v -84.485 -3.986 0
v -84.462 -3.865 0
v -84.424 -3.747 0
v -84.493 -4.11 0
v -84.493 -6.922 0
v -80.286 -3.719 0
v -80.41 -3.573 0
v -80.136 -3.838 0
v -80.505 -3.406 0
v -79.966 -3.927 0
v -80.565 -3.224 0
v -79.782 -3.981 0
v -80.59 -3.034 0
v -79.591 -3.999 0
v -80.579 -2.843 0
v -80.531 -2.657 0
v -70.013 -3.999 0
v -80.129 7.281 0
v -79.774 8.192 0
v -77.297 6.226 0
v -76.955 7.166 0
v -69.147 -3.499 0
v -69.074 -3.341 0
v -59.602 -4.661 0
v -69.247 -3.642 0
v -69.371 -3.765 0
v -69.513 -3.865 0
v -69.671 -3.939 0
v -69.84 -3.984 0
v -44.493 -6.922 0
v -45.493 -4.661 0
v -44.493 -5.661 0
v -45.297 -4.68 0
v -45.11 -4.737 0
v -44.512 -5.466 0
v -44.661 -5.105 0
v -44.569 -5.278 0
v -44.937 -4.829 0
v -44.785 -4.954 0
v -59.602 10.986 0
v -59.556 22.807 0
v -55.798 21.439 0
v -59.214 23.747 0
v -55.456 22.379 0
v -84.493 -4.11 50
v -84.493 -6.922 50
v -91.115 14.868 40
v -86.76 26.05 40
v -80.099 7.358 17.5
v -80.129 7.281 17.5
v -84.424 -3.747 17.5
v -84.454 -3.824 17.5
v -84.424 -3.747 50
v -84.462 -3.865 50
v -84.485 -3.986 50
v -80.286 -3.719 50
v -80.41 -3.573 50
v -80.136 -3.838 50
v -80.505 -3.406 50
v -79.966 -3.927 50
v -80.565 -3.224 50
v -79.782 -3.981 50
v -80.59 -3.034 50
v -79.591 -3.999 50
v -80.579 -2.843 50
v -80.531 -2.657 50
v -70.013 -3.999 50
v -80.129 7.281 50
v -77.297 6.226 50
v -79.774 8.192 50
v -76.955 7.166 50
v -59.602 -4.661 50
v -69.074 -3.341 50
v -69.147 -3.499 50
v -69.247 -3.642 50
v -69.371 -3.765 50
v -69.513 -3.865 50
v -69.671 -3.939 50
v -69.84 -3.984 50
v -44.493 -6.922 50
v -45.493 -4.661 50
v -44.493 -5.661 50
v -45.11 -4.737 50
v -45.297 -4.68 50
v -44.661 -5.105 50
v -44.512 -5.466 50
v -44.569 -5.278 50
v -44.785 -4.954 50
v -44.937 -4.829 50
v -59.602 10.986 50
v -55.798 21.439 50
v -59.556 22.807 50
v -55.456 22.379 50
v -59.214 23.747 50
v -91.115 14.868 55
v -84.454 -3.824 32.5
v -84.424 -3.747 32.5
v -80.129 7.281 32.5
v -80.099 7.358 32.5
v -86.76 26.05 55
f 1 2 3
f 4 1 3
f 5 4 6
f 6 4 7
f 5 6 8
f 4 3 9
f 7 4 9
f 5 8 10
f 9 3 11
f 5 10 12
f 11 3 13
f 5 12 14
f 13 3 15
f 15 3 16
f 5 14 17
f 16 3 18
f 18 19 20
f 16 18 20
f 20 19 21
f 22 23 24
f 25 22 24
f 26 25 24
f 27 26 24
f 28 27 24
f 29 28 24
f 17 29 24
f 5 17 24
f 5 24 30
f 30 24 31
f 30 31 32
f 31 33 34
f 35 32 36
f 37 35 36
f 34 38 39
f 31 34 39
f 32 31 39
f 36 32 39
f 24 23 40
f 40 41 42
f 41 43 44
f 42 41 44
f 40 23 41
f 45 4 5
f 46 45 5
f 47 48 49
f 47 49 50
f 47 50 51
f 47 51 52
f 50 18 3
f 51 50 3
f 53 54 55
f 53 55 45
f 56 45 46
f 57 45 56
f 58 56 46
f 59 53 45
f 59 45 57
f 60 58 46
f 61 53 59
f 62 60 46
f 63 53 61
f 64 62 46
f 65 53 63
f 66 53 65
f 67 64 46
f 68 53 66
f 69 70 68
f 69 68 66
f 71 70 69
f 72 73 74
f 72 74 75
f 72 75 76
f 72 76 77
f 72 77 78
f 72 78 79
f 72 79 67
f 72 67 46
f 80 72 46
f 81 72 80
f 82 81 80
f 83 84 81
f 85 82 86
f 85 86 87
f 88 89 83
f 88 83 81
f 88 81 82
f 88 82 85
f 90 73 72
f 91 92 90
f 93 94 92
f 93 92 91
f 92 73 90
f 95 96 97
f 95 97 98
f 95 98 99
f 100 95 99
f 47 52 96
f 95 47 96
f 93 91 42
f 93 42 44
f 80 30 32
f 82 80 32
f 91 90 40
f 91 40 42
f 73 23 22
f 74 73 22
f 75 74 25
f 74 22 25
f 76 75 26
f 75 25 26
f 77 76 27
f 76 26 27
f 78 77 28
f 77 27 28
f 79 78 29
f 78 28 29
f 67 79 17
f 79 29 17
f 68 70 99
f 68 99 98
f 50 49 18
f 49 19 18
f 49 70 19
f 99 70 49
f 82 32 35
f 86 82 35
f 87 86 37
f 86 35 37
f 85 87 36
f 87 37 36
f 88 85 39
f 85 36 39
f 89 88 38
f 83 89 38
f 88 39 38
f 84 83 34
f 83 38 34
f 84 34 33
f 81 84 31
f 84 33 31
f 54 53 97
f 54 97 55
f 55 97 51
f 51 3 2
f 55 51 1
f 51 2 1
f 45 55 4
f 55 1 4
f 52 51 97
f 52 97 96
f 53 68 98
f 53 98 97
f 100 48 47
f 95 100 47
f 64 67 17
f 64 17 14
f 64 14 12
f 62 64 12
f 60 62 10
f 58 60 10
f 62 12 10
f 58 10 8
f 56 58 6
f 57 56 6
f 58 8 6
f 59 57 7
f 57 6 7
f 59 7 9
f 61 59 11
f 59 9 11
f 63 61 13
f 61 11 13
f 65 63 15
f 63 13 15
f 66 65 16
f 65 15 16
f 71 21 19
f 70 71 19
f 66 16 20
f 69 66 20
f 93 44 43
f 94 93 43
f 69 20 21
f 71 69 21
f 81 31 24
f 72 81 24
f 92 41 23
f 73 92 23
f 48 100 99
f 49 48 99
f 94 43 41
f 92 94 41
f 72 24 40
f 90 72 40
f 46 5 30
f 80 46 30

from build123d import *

# Parameters (mm, degrees)
SALIENTE_EXTRUIR1_DEPTH = 50
CROQUIS3_W              = 15
CROQUIS3_H              = 12


with BuildPart() as part:
    # Croquis1 → Saliente-Extruir1 (new body)
    with BuildSketch(Plane.XY):
        with BuildLine():
            Line((-84.492533904, -6.921751872), (-44.492533904, -6.921751872))
            Line((-44.492533904, -6.921751872), (-44.492533904, -5.660932217))
            ThreePointArc((-44.492533904, -5.660932217), (-44.785427123, -4.953825435), (-45.492533904, -4.660932217))
            Line((-45.492533904, -4.660932217), (-59.602097354, -4.660932217))
            Line((-59.602097354, -4.660932217), (-59.602097354, 10.986403293))
            Line((-59.602097354, 10.986403293), (-55.79772825, 21.438821499))
            Line((-55.79772825, 21.438821499), (-55.455708107, 22.37851412))
            Line((-55.455708107, 22.37851412), (-59.21447859, 23.746594693))
            Line((-59.21447859, 23.746594693), (-59.556498733, 22.806902073))
            Line((-59.556498733, 22.806902073), (-69.073702494, -3.341400356))
            ThreePointArc((-69.073702494, -3.341400356), (-69.439818678, -3.818532257), (-70.013395115, -3.999380213))
            Line((-70.013395115, -3.999380213), (-79.590995067, -3.999380213))
            ThreePointArc((-79.590995067, -3.999380213), (-80.410147111, -3.572956649), (-80.530687688, -2.657360069))
            Line((-80.530687688, -2.657360069), (-77.297371662, 6.226102703))
            Line((-77.297371662, 6.226102703), (-76.955351518, 7.165795324))
            Line((-76.955351518, 7.165795324), (-79.774429381, 8.191855754))
            Line((-79.774429381, 8.191855754), (-80.129339821, 7.280632657))
            Line((-80.129339821, 7.280632657), (-84.424349875, -3.746691195))
            ThreePointArc((-84.424349875, -3.746691195), (-84.475340083, -3.924982082), (-84.492533904, -4.109622312))
            Line((-84.492533904, -4.109622312), (-84.492533904, -6.921751872))
        make_face()
    extrude(amount=SALIENTE_EXTRUIR1_DEPTH)

    # Barrer9: sweep along a path in Croquis7
    with BuildLine(Plane(origin=(-43.940534578, 17.114309903, -27.225418163), x_dir=(0.465907986, -0.181465559, -0.866025404), z_dir=(0.806976303, -0.314307567, 0.5))) as barrer9_path:
        Line((-60.30471847, -28.214335671), (-86.285480583, -13.214335671))
    # Croquis3 → Barrer9 (sweep)
    with BuildSketch(Plane(origin=(-72.036984482, 28.057539326, 0), x_dir=(0, 0, 1), z_dir=(-0.931815971, 0.362931117, 0))):
        with Locations((25, -28.214335671)):
            Rectangle(CROQUIS3_W, CROQUIS3_H)
    sweep(path=barrer9_path.line)


solid = part.part
